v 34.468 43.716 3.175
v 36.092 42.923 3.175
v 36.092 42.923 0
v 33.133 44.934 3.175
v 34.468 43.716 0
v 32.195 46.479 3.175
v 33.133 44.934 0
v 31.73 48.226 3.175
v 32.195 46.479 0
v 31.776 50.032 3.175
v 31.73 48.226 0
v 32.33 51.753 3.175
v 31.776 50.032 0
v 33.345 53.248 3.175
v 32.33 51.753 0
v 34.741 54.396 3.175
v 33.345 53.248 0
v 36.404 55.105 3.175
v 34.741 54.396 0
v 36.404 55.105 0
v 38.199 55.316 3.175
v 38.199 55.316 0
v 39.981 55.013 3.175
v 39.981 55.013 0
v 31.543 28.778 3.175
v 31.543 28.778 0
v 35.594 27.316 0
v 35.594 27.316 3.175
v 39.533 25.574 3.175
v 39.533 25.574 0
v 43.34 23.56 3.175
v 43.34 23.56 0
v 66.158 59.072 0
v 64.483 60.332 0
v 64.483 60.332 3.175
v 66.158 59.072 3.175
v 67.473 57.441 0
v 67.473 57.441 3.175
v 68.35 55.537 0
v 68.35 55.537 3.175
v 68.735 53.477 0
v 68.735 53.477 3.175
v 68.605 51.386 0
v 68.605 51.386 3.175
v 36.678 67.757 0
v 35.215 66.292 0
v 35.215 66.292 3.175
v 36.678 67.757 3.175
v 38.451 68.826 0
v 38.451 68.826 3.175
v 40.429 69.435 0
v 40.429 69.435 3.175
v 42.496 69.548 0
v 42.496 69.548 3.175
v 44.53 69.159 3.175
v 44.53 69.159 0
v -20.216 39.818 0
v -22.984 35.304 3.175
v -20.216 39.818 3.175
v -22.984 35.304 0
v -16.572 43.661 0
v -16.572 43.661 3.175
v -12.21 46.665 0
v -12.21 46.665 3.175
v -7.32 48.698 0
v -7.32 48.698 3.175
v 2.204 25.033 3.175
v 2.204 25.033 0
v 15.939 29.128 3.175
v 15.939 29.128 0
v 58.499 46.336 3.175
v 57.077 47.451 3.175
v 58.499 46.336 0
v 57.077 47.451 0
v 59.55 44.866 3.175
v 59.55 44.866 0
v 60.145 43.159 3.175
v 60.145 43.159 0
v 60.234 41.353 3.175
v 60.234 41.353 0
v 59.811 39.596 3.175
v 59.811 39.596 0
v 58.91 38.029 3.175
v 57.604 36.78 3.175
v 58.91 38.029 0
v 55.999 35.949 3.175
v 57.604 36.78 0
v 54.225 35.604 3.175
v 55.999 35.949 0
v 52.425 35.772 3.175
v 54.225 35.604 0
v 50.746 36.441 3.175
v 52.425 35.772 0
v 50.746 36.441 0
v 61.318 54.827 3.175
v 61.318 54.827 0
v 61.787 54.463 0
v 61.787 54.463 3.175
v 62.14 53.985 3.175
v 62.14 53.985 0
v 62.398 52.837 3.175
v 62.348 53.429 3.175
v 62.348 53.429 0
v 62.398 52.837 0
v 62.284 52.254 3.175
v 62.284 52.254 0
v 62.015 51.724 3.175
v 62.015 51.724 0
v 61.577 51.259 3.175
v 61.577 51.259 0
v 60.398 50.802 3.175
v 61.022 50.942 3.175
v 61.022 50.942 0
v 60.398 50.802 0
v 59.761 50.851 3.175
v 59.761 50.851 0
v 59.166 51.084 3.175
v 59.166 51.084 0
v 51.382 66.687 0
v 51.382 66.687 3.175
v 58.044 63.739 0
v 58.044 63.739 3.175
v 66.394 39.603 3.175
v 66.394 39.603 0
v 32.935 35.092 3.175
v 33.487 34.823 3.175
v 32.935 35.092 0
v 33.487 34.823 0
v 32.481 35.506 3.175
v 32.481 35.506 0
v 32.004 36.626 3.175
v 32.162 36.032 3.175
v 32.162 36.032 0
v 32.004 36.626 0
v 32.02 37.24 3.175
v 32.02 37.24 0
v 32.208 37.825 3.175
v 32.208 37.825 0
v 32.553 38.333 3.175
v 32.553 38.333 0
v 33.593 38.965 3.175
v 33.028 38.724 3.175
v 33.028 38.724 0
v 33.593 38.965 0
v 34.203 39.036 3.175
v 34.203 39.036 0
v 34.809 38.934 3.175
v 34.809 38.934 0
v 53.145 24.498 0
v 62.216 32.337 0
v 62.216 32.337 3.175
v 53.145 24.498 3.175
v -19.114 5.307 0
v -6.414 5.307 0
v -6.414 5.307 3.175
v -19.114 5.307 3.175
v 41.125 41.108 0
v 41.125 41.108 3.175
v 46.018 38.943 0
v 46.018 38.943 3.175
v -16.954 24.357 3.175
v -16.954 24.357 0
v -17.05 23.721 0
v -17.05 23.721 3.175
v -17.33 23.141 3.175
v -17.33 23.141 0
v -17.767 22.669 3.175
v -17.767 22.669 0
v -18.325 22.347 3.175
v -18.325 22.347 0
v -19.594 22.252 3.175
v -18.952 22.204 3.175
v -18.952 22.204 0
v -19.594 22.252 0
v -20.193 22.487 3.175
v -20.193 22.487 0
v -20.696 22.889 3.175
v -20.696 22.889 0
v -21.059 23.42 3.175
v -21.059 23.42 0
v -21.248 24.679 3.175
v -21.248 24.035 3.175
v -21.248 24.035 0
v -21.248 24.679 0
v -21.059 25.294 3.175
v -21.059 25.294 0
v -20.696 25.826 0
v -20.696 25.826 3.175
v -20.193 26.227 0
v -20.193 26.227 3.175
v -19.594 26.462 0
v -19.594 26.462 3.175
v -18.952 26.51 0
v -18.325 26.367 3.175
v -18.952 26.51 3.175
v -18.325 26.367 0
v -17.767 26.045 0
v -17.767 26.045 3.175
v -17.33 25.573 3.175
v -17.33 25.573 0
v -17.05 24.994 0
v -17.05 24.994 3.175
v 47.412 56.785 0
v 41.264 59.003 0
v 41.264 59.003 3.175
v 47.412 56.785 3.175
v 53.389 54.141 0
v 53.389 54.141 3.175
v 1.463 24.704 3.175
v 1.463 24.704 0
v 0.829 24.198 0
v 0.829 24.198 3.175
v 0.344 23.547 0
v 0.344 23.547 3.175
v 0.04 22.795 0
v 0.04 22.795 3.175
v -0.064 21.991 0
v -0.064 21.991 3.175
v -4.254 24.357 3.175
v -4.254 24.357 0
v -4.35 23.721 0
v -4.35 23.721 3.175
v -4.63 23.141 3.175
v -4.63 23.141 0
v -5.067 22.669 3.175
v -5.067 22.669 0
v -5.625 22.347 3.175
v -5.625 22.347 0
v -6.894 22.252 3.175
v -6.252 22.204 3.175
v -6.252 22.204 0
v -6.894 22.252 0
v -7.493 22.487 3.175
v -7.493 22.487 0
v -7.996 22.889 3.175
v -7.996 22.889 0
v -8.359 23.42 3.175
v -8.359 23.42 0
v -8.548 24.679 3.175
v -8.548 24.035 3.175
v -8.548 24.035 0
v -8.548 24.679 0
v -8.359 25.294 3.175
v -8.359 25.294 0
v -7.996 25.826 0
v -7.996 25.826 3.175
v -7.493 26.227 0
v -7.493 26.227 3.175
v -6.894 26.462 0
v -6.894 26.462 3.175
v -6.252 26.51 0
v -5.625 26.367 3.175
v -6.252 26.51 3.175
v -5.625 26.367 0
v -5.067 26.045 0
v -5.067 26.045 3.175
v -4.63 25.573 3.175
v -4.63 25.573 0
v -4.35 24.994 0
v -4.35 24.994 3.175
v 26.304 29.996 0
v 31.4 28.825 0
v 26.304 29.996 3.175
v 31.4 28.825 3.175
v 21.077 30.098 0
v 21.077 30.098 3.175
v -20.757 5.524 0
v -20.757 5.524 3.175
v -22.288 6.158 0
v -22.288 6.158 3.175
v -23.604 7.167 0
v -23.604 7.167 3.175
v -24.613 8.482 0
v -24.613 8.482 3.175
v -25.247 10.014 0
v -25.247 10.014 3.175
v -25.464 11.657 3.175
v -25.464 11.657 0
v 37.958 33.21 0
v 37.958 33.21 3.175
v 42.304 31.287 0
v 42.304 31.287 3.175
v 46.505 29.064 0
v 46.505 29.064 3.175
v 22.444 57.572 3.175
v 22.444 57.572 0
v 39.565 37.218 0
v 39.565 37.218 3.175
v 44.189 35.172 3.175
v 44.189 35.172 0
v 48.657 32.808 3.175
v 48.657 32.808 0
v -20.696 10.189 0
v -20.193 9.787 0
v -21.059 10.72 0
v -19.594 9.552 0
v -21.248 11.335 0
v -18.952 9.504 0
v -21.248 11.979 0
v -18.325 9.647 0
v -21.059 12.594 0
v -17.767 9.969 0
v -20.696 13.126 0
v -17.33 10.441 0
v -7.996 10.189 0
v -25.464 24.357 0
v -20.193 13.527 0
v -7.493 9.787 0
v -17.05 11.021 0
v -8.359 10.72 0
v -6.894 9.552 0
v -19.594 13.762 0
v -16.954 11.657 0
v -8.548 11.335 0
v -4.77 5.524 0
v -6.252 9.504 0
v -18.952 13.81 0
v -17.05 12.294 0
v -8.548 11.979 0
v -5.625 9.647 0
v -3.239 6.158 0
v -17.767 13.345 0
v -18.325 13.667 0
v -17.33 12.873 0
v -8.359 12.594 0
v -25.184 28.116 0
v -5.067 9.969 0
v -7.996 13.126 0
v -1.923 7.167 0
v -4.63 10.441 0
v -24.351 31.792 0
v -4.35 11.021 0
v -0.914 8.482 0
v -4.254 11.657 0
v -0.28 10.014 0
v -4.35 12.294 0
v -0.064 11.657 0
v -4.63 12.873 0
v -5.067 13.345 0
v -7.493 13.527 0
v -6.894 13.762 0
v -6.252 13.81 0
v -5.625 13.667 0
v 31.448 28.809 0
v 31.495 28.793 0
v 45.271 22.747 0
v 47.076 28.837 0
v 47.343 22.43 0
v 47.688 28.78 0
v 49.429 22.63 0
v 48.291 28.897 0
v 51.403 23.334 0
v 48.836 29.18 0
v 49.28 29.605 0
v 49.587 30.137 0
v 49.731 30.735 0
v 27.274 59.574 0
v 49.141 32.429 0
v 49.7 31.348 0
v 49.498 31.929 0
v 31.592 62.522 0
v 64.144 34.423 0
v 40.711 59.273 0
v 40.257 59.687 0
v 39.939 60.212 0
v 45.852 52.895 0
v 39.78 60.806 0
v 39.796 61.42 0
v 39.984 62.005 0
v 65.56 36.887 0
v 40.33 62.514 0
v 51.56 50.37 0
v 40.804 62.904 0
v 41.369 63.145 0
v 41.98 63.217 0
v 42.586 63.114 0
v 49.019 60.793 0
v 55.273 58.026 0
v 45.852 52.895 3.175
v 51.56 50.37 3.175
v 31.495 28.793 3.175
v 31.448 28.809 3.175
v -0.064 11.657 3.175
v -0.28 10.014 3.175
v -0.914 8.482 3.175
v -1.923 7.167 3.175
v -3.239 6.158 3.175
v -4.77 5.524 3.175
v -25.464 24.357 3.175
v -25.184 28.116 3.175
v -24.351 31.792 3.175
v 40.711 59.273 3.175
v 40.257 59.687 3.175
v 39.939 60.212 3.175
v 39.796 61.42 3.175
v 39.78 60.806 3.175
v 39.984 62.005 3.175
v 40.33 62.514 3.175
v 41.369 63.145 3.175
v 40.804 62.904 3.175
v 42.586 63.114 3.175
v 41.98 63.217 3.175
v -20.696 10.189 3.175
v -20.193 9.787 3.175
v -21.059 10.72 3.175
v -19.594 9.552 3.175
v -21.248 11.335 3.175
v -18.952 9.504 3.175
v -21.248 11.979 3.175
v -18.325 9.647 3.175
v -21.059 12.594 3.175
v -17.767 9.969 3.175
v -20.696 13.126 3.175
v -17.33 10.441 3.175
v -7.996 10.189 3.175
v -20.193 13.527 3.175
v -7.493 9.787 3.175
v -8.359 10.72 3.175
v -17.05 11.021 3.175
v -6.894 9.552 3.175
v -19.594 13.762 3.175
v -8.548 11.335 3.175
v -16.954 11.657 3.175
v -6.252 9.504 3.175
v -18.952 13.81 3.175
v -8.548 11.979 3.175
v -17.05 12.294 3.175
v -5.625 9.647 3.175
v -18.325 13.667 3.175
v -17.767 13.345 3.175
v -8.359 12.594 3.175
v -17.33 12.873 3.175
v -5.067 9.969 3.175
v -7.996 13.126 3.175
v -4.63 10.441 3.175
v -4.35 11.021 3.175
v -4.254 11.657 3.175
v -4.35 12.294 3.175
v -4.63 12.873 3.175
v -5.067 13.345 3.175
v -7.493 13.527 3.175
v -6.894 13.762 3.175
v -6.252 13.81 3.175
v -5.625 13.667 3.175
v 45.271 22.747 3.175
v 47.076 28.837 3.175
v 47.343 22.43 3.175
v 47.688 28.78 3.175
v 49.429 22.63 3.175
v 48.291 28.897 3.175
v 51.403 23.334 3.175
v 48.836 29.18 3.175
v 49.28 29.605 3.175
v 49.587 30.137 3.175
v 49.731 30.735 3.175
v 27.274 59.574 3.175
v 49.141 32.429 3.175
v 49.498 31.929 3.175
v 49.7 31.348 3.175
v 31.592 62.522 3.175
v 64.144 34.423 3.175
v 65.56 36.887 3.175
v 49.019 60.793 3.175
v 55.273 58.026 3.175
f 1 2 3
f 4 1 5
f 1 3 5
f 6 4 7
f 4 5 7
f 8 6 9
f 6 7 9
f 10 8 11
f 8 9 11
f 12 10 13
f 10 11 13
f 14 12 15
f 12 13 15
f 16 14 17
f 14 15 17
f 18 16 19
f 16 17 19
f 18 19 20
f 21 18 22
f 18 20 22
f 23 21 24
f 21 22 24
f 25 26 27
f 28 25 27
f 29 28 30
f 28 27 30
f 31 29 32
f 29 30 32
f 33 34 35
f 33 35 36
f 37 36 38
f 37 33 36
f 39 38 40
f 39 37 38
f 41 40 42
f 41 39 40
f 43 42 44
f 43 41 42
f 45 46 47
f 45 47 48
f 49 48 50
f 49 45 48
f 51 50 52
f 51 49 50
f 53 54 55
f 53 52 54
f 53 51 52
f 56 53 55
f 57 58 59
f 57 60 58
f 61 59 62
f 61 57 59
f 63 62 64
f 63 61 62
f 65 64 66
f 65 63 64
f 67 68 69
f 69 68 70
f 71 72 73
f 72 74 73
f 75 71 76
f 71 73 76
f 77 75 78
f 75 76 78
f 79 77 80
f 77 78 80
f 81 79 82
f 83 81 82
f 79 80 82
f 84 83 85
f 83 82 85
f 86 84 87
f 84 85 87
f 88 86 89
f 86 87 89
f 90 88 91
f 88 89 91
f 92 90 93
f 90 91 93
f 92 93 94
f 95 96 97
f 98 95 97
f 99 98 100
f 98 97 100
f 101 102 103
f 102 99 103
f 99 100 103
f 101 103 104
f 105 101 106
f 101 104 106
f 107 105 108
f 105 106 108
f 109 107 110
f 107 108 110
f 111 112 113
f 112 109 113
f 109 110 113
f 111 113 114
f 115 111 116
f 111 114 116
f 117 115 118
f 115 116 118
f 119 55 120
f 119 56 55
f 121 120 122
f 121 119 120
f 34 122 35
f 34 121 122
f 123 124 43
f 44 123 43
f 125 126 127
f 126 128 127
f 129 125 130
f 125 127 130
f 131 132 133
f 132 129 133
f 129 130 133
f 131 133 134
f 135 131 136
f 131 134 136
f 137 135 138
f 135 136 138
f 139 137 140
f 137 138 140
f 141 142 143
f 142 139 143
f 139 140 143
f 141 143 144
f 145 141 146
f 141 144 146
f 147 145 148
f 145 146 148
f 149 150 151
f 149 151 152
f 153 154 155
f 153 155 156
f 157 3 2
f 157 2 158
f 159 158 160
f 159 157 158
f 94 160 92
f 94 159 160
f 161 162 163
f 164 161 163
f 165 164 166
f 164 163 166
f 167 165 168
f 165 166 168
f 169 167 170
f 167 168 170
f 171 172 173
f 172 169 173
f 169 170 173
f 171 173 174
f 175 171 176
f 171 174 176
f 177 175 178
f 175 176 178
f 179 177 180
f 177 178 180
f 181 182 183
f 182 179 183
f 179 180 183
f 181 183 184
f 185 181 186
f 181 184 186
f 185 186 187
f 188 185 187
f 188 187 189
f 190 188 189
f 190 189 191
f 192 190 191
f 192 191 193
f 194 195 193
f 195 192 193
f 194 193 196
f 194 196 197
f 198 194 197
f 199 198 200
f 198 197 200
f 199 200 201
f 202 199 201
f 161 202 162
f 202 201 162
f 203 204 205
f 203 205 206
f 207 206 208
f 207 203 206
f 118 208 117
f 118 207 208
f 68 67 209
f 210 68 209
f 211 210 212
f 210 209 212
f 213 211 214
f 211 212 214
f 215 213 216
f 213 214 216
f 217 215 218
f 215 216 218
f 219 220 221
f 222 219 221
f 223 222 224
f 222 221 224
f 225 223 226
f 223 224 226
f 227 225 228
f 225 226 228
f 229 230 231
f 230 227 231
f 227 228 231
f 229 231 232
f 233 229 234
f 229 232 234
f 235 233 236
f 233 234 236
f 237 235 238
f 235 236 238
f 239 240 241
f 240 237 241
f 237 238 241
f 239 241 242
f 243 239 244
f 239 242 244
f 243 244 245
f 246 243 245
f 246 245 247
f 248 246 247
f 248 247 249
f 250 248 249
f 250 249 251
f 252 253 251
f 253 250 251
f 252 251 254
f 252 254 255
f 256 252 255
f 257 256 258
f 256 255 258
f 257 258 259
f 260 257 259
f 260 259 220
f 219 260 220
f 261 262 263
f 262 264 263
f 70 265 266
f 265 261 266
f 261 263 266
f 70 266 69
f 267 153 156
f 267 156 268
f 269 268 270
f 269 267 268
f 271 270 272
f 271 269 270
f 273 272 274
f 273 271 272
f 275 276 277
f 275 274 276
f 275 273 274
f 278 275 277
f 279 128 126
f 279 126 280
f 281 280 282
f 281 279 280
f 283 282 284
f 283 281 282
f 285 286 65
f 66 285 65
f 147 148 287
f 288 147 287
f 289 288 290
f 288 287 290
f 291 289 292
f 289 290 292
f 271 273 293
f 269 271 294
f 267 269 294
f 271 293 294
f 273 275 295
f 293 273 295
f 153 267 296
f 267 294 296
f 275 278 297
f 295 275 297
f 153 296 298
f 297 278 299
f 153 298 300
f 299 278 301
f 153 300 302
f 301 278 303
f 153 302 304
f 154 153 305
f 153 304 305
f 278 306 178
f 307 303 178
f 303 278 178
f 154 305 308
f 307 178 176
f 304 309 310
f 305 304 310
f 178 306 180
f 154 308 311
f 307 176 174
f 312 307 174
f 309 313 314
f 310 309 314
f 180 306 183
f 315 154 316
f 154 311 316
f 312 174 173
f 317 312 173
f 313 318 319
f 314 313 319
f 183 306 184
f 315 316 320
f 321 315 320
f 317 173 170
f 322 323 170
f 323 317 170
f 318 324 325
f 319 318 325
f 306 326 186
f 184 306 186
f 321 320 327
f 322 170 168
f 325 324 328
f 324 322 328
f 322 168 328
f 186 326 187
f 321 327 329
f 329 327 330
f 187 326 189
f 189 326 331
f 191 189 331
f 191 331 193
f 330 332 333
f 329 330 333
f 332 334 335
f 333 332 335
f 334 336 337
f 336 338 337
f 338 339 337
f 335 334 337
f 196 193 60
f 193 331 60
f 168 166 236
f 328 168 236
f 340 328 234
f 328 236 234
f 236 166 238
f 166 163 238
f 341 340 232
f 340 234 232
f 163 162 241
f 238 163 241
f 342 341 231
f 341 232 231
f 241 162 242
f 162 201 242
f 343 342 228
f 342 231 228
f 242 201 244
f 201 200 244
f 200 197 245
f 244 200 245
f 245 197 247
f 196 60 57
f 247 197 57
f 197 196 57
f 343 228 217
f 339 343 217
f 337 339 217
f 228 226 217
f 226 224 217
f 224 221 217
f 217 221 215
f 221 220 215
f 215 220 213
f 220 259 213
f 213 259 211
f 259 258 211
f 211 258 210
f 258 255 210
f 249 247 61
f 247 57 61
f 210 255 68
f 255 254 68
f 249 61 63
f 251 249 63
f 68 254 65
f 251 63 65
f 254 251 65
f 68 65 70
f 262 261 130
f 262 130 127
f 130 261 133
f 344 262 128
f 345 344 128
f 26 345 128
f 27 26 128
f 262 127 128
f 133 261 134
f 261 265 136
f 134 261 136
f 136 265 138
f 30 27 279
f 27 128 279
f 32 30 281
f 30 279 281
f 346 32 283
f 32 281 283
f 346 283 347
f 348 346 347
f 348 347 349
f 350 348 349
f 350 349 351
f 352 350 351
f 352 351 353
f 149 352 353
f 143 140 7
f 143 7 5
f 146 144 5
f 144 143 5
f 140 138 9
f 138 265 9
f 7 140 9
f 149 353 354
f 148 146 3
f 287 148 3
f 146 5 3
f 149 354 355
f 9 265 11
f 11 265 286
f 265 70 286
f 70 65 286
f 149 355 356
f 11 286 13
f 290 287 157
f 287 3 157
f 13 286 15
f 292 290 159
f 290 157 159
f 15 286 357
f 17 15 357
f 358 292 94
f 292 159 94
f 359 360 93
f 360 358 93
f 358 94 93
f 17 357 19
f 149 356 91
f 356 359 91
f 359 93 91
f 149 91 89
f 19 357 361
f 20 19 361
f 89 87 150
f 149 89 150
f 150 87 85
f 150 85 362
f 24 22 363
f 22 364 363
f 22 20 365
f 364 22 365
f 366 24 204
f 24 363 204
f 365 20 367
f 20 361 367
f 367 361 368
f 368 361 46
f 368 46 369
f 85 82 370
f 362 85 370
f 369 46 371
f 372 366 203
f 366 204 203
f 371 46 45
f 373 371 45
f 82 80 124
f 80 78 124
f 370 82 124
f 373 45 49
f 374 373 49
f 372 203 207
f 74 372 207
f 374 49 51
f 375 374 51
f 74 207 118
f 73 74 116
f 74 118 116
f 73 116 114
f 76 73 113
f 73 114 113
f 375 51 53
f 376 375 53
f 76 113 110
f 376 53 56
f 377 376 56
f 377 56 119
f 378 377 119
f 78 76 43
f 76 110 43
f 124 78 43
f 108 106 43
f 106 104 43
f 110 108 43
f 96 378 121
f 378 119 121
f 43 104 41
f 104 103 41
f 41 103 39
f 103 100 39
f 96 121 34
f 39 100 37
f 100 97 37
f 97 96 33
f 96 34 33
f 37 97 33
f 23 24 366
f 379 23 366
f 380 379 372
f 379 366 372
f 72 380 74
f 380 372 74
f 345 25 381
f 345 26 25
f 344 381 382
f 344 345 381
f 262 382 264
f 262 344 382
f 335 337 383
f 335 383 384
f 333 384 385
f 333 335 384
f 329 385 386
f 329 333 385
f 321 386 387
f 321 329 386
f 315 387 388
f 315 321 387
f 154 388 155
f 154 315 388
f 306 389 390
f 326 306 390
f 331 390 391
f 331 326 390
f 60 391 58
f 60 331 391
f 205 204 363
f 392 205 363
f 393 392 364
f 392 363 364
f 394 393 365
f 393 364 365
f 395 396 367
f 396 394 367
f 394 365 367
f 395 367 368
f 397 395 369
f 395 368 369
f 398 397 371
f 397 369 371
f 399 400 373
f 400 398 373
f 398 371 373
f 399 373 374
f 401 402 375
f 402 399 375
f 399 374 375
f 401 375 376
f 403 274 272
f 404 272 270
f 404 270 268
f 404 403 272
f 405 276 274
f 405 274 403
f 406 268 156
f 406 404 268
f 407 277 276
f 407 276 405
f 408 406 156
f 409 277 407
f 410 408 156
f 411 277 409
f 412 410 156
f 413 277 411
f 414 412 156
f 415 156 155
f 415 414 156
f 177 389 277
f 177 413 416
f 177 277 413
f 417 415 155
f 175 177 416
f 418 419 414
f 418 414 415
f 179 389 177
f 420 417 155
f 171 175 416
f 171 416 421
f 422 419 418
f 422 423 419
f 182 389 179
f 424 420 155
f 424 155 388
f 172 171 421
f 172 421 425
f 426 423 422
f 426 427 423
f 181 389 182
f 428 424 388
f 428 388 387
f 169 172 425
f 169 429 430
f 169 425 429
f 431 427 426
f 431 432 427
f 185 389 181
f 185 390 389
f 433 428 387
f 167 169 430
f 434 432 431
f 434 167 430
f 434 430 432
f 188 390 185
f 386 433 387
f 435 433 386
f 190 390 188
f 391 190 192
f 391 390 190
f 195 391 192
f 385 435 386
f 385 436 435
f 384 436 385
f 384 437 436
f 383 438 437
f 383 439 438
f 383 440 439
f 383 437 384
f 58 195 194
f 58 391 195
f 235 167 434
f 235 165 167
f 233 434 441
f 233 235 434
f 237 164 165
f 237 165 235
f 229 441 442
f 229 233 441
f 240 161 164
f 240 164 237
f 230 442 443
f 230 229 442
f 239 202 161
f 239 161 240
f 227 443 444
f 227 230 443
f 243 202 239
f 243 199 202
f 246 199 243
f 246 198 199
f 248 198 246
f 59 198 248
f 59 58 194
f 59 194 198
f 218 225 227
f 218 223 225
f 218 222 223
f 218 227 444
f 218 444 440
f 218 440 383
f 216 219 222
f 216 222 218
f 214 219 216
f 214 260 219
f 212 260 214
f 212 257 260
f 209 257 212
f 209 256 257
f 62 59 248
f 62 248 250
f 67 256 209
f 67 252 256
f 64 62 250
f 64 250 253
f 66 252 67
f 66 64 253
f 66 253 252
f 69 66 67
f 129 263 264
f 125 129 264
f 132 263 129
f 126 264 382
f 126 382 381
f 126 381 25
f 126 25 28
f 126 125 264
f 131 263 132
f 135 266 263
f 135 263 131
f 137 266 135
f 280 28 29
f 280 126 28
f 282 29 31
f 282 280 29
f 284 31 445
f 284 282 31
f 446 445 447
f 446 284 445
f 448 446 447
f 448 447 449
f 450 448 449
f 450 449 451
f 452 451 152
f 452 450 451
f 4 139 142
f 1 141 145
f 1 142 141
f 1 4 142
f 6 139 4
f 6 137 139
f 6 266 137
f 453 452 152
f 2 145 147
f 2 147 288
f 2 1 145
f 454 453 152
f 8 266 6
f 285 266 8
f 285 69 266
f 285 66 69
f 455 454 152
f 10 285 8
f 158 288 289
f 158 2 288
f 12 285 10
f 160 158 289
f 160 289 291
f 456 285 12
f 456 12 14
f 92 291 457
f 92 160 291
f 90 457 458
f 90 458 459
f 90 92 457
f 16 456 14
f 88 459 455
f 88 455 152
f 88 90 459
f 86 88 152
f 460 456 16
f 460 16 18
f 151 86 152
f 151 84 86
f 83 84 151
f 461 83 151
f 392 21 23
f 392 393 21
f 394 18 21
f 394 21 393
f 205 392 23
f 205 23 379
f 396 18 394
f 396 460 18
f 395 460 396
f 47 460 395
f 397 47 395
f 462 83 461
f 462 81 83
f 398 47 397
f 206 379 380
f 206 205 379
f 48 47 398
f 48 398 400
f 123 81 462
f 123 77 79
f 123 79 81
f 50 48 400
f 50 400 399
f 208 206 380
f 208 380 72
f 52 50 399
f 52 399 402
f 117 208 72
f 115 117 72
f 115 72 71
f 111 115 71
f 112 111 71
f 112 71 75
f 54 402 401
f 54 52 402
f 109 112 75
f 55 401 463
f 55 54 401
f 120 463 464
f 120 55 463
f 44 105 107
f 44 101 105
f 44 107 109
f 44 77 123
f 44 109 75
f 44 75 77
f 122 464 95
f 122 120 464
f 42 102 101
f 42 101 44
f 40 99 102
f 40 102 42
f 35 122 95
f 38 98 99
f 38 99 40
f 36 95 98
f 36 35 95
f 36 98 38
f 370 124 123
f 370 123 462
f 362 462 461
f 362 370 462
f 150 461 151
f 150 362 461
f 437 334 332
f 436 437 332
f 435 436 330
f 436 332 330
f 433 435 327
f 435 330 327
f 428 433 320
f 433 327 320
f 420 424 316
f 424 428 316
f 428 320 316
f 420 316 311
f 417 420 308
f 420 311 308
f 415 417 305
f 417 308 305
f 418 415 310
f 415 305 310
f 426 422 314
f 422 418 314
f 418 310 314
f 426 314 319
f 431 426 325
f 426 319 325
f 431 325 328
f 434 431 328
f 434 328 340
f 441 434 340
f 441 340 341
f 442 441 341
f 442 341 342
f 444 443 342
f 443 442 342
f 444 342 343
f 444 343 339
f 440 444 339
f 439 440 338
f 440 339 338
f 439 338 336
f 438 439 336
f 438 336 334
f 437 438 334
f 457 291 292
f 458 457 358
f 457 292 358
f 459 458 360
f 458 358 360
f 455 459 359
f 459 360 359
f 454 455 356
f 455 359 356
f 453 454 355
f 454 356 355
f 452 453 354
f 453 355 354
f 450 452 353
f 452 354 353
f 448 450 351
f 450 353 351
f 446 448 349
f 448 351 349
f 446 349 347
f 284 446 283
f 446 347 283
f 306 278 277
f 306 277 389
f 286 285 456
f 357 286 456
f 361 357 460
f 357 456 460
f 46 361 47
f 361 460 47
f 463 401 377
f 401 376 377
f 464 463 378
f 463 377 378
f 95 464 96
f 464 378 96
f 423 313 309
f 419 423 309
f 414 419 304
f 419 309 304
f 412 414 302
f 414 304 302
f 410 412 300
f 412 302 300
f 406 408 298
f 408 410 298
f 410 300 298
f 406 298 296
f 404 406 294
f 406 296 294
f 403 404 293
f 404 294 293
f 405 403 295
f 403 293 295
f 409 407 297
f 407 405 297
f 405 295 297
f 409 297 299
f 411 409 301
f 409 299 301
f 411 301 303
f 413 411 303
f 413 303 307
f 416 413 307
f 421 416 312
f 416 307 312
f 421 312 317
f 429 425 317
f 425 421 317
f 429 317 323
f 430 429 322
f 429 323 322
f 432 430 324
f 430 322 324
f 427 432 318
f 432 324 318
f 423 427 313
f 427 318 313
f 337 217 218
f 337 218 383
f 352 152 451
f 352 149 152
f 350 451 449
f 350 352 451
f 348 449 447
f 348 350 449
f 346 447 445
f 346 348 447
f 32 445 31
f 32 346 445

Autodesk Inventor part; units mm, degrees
ref_plane "YZ Plane" through (0, 0, 0) normal (1, 0, 0) x (0, 1, 0)
ref_plane "XZ Plane" through (0, 0, 0) normal (0, 1, 0) x (-1, 0, 0)
ref_plane "XY Plane" through (0, 0, 0) normal (0, 0, 1) x (1, 0, 0)
sketch "Sketch1" plane through (0, 0, 0) normal (0, 0, 1) x (1, 0, 0)
  arc A0 (-0.0635, 21.727) -> (-1.9234, 26.2171) centre (-6.4135, 21.727) ccw projected
  line L0 (-12.7635, 37.0572) -> (-1.9234, 26.2171) projected
  arc A1 (-12.7635, 37.0572) -> (-22.9837, 35.3037) centre (-17.2536, 32.5671) ccw projected
  arc A2 (-22.9837, 35.3037) -> (-25.4635, 24.3572) centre (-0.0635, 24.3572) ccw projected
  line L1 (-25.4635, 8.4822) -> (-25.4635, 24.3572) projected
  arc A3 (-25.4635, 8.4822) -> (-20.3429, -6.8118) centre (-0.0635, 8.4822) ccw projected
  line L2 (2.6238, -37.2648) -> (-20.3429, -6.8118) projected
  arc A4 (2.6238, -37.2648) -> (22.9032, -21.9707) centre (12.7635, -29.6178) ccw projected
  line L3 (1.2167, 6.7848) -> (22.9032, -21.9707) projected
  arc A5 (-0.0635, 10.6083) -> (1.2167, 6.7848) centre (6.2865, 10.6083) ccw projected
  line L4 (-0.0635, 21.727) -> (-0.0635, 10.6083) projected
  circle A6 centre (-19.1135, 24.3572) radius 2.159 projected
  circle A7 centre (-6.4135, 24.3572) radius 2.159 projected
  circle A8 centre (-6.4135, -13.7428) radius 2.159 projected
  circle A9 centre (-6.4135, -1.0428) radius 2.159 projected
  circle A10 centre (-6.4135, 11.6572) radius 2.159 projected
  circle A11 centre (-19.1135, 11.6572) radius 2.159 projected
  circle A12 centre (12.7635, -29.6178) radius 2.159 projected
  line L5 (81.8636, -46.7367) -> (81.8636, 125.7735) construction
  line L6 (61.5605, 6.4848) -> (81.5605, 6.4848) construction
  line L7 (81.5605, 6.4848) -> (81.5605, 146.4848) construction
  line L8 (81.5605, 146.4848) -> (61.5605, 146.4848) construction
  line L9 (61.5605, 146.4848) -> (61.5605, 6.4848) construction
  circle A13 centre (53.9115, 41.9458) radius 25.4 construction
  arc A14 (49.9598, 13.7707) -> (6.7541, 27.2154) centre (12.7635, -29.6178) ccw construction
  arc A15 (53.9115, 41.9458) -> (38.0365, 48.9684) centre (12.7635, -29.6178) ccw construction
  arc A16 (57.0767, 47.4507) -> (39.9806, 55.0134) centre (12.7635, -29.6178) ccw
  arc A17 (50.7463, 36.4409) -> (36.0924, 42.9233) centre (12.7635, -29.6178) ccw
  arc A18 (50.7463, 36.4409) -> (57.0767, 47.4507) centre (53.9115, 41.9458) ccw
  arc A19 (39.9806, 55.0134) -> (36.0924, 42.9233) centre (38.0365, 48.9684) ccw
  circle A20 centre (38.0365, 48.9684) radius 25.4 construction
  arc A21 (53.9115, 41.9458) -> (38.0365, 48.9684) centre (12.7635, -29.6178) ccw construction
  arc A22 (60.242, 52.9556) -> (41.9247, 61.0585) centre (12.7635, -29.6178) ccw construction
  arc A23 (47.581, 30.936) -> (34.1483, 36.8782) centre (12.7635, -29.6178) ccw construction
  arc A24 (47.581, 30.936) -> (60.242, 52.9556) centre (53.9115, 41.9458) ccw
  arc A25 (41.9247, 61.0585) -> (34.1483, 36.8782) centre (38.0365, 48.9684) ccw construction
  circle A26 centre (-19.1135, 11.6572) radius 6.35
  circle A27 centre (-6.4135, 11.6572) radius 6.35
  line L10 (-6.4135, 5.3072) -> (-19.1135, 5.3072)
  line L11 (-0.0635, 21.727) -> (-0.0635, 24.3572)
  arc A28 (47.581, 30.936) -> (34.1483, 36.8782) centre (12.7635, -29.6178) ccw construction
  arc A29 (48.6572, 32.8077) -> (34.8093, 38.9335) centre (12.7635, -29.6178) ccw
  arc A30 (46.5049, 29.0644) -> (33.4874, 34.8229) centre (12.7635, -29.6178) ccw
  arc A31 (46.5049, 29.0644) -> (48.6572, 32.8077) centre (47.581, 30.936) ccw
  arc A32 (34.8093, 38.9335) -> (33.4874, 34.8229) centre (34.1483, 36.8782) ccw
  line L12 (38.0365, 48.9684) -> (12.7635, -29.6178) construction
  line L13 (53.9115, 41.9458) -> (12.7635, -29.6178) construction
  arc A33 (60.242, 52.9556) -> (41.9247, 61.0585) centre (12.7635, -29.6178) ccw construction
  arc A34 (61.3181, 54.8273) -> (42.5856, 63.1139) centre (12.7635, -29.6178) ccw
  arc A35 (59.1658, 51.0839) -> (41.2637, 59.0032) centre (12.7635, -29.6178) ccw
  arc A36 (59.1658, 51.0839) -> (61.3181, 54.8273) centre (60.242, 52.9556) ccw
  arc A37 (42.5856, 63.1139) -> (41.2637, 59.0032) centre (41.9247, 61.0585) ccw
  line L14 (38.0365, 48.9684) -> (41.9247, 61.0585) construction
  arc A38 (56.0006, 45.579) -> (39.3196, 52.9581) centre (12.7635, -29.6178) ccw
  arc A39 (56.0006, 45.579) -> (64.4834, 60.3321) centre (60.242, 52.9556) ccw
  arc A40 (64.4834, 60.3321) -> (44.5297, 69.1589) centre (12.7635, -29.6178) ccw
  arc A41 (44.5297, 69.1589) -> (39.3196, 52.9581) centre (41.9247, 61.0585) ccw
  arc A42 (51.8224, 38.3126) -> (36.7534, 44.9786) centre (12.7635, -29.6178) ccw
  arc A43 (36.7534, 44.9786) -> (31.5433, 28.7778) centre (34.1483, 36.8782) ccw
  arc A44 (43.3396, 23.5595) -> (31.5433, 28.7778) centre (12.7635, -29.6178) ccw
  arc A45 (43.3396, 23.5595) -> (51.8224, 38.3126) centre (47.581, 30.936) ccw
  line L15 (62.2155, 32.3368) -> (53.1447, 24.498)
  line L16 (66.3936, 39.6032) -> (68.605, 51.386)
  line L17 (34.4081, 61.139) -> (-7.3204, 48.6985)
  arc A46 (-7.3204, 48.6985) -> (-22.9837, 35.3037) centre (-0.0635, 24.3572) ccw
  line L18 (-0.0635, 24.3572) -> (37.7202, 35.6217)
  point P0 (0, 0)
  point P1 (-0.0635, 11.6572)
  point P2 (-25.4635, 11.6572)
  point P3 (-12.7635, 11.6572)
  point P4 (33.4184, 60.8439)
  point P5 (26.9132, 32.3998)
  dimension "d0" = 20
  dimension "d1" = 140
  dimension "d2" = 50.8
  dimension "d3" = 57.15
  dimension "d4" = 53.975
  dimension "d6" = 12.7
  dimension "d7" = 38.1
  dimension "d8" = 25.4
  dimension "d11" = 4.318
  dimension "d12" = 12.7
  dimension "d13" = 12.7
  dimension "d14" = 6.35
  dimension "d15" = 6.35
extrude "Extrusion1" add sketch "Sketch1" along normal blind 3.175 contours L4 A27 A26 L1 A2 A1 L0 A0 | A0 L0 A1 A46 L17 A41 A19 A43 L18 L11 | A27 | A27 L10 A26 | A26 | L18 A30 A31 A24 A45 A44 A43 | A43 A19 A17 A18 A45 A24 A31 A29 A32 A30 L18 | A41 A40 A39 A18 A16 A19 | A45 A24 L15 | A18 A39 A24 A45 | A24 A39 L16
fillet "Fillet1" radius 25.4 2 edges at (26.9132, 32.3998, 1.5875) (33.4184, 60.8439, 1.5875)
fillet "Fillet2" radius 3.175 1 edges at (-0.0635, 24.3572, 1.5875)
properties part number "IntakeForearm" material "Polycarbonate, Clear"
